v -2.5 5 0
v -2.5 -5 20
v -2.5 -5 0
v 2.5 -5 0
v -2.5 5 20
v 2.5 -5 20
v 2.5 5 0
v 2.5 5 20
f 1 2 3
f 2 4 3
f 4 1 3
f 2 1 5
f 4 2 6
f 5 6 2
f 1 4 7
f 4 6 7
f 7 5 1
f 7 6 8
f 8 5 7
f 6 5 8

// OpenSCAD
module rectangle(x, y, z, l, w, h, xRot, yRot, zRot, color)
{
    color(c=color, alpha=1) { translate([x, y, z]) { rotate([xRot, yRot, zRot]) {
        polyhedron( points = [
                        [-l/2, -w/2, 0],
                        [-l/2, -w/2, h],
                        [-l/2, w/2, 0],
                        [-l/2, w/2, h],
                        [l/2, -w/2, 0],
                        [l/2, -w/2, h],
                        [l/2, w/2, 0],
                        [l/2, w/2, h]],
                    faces = [
                        [0,1,2],[0,4,1],[0,2,4],
                        [3,2,1],[5,1,4],[1,5,3],
                        [6,4,2],[6,5,4],[2,3,6],
                        [7,5,6],[6,3,7],[7,3,5]]
        );
    }}}
}
rectangle(0,0,0,5,10,20,0,0,0,[0.2,0.4,0.6]);
